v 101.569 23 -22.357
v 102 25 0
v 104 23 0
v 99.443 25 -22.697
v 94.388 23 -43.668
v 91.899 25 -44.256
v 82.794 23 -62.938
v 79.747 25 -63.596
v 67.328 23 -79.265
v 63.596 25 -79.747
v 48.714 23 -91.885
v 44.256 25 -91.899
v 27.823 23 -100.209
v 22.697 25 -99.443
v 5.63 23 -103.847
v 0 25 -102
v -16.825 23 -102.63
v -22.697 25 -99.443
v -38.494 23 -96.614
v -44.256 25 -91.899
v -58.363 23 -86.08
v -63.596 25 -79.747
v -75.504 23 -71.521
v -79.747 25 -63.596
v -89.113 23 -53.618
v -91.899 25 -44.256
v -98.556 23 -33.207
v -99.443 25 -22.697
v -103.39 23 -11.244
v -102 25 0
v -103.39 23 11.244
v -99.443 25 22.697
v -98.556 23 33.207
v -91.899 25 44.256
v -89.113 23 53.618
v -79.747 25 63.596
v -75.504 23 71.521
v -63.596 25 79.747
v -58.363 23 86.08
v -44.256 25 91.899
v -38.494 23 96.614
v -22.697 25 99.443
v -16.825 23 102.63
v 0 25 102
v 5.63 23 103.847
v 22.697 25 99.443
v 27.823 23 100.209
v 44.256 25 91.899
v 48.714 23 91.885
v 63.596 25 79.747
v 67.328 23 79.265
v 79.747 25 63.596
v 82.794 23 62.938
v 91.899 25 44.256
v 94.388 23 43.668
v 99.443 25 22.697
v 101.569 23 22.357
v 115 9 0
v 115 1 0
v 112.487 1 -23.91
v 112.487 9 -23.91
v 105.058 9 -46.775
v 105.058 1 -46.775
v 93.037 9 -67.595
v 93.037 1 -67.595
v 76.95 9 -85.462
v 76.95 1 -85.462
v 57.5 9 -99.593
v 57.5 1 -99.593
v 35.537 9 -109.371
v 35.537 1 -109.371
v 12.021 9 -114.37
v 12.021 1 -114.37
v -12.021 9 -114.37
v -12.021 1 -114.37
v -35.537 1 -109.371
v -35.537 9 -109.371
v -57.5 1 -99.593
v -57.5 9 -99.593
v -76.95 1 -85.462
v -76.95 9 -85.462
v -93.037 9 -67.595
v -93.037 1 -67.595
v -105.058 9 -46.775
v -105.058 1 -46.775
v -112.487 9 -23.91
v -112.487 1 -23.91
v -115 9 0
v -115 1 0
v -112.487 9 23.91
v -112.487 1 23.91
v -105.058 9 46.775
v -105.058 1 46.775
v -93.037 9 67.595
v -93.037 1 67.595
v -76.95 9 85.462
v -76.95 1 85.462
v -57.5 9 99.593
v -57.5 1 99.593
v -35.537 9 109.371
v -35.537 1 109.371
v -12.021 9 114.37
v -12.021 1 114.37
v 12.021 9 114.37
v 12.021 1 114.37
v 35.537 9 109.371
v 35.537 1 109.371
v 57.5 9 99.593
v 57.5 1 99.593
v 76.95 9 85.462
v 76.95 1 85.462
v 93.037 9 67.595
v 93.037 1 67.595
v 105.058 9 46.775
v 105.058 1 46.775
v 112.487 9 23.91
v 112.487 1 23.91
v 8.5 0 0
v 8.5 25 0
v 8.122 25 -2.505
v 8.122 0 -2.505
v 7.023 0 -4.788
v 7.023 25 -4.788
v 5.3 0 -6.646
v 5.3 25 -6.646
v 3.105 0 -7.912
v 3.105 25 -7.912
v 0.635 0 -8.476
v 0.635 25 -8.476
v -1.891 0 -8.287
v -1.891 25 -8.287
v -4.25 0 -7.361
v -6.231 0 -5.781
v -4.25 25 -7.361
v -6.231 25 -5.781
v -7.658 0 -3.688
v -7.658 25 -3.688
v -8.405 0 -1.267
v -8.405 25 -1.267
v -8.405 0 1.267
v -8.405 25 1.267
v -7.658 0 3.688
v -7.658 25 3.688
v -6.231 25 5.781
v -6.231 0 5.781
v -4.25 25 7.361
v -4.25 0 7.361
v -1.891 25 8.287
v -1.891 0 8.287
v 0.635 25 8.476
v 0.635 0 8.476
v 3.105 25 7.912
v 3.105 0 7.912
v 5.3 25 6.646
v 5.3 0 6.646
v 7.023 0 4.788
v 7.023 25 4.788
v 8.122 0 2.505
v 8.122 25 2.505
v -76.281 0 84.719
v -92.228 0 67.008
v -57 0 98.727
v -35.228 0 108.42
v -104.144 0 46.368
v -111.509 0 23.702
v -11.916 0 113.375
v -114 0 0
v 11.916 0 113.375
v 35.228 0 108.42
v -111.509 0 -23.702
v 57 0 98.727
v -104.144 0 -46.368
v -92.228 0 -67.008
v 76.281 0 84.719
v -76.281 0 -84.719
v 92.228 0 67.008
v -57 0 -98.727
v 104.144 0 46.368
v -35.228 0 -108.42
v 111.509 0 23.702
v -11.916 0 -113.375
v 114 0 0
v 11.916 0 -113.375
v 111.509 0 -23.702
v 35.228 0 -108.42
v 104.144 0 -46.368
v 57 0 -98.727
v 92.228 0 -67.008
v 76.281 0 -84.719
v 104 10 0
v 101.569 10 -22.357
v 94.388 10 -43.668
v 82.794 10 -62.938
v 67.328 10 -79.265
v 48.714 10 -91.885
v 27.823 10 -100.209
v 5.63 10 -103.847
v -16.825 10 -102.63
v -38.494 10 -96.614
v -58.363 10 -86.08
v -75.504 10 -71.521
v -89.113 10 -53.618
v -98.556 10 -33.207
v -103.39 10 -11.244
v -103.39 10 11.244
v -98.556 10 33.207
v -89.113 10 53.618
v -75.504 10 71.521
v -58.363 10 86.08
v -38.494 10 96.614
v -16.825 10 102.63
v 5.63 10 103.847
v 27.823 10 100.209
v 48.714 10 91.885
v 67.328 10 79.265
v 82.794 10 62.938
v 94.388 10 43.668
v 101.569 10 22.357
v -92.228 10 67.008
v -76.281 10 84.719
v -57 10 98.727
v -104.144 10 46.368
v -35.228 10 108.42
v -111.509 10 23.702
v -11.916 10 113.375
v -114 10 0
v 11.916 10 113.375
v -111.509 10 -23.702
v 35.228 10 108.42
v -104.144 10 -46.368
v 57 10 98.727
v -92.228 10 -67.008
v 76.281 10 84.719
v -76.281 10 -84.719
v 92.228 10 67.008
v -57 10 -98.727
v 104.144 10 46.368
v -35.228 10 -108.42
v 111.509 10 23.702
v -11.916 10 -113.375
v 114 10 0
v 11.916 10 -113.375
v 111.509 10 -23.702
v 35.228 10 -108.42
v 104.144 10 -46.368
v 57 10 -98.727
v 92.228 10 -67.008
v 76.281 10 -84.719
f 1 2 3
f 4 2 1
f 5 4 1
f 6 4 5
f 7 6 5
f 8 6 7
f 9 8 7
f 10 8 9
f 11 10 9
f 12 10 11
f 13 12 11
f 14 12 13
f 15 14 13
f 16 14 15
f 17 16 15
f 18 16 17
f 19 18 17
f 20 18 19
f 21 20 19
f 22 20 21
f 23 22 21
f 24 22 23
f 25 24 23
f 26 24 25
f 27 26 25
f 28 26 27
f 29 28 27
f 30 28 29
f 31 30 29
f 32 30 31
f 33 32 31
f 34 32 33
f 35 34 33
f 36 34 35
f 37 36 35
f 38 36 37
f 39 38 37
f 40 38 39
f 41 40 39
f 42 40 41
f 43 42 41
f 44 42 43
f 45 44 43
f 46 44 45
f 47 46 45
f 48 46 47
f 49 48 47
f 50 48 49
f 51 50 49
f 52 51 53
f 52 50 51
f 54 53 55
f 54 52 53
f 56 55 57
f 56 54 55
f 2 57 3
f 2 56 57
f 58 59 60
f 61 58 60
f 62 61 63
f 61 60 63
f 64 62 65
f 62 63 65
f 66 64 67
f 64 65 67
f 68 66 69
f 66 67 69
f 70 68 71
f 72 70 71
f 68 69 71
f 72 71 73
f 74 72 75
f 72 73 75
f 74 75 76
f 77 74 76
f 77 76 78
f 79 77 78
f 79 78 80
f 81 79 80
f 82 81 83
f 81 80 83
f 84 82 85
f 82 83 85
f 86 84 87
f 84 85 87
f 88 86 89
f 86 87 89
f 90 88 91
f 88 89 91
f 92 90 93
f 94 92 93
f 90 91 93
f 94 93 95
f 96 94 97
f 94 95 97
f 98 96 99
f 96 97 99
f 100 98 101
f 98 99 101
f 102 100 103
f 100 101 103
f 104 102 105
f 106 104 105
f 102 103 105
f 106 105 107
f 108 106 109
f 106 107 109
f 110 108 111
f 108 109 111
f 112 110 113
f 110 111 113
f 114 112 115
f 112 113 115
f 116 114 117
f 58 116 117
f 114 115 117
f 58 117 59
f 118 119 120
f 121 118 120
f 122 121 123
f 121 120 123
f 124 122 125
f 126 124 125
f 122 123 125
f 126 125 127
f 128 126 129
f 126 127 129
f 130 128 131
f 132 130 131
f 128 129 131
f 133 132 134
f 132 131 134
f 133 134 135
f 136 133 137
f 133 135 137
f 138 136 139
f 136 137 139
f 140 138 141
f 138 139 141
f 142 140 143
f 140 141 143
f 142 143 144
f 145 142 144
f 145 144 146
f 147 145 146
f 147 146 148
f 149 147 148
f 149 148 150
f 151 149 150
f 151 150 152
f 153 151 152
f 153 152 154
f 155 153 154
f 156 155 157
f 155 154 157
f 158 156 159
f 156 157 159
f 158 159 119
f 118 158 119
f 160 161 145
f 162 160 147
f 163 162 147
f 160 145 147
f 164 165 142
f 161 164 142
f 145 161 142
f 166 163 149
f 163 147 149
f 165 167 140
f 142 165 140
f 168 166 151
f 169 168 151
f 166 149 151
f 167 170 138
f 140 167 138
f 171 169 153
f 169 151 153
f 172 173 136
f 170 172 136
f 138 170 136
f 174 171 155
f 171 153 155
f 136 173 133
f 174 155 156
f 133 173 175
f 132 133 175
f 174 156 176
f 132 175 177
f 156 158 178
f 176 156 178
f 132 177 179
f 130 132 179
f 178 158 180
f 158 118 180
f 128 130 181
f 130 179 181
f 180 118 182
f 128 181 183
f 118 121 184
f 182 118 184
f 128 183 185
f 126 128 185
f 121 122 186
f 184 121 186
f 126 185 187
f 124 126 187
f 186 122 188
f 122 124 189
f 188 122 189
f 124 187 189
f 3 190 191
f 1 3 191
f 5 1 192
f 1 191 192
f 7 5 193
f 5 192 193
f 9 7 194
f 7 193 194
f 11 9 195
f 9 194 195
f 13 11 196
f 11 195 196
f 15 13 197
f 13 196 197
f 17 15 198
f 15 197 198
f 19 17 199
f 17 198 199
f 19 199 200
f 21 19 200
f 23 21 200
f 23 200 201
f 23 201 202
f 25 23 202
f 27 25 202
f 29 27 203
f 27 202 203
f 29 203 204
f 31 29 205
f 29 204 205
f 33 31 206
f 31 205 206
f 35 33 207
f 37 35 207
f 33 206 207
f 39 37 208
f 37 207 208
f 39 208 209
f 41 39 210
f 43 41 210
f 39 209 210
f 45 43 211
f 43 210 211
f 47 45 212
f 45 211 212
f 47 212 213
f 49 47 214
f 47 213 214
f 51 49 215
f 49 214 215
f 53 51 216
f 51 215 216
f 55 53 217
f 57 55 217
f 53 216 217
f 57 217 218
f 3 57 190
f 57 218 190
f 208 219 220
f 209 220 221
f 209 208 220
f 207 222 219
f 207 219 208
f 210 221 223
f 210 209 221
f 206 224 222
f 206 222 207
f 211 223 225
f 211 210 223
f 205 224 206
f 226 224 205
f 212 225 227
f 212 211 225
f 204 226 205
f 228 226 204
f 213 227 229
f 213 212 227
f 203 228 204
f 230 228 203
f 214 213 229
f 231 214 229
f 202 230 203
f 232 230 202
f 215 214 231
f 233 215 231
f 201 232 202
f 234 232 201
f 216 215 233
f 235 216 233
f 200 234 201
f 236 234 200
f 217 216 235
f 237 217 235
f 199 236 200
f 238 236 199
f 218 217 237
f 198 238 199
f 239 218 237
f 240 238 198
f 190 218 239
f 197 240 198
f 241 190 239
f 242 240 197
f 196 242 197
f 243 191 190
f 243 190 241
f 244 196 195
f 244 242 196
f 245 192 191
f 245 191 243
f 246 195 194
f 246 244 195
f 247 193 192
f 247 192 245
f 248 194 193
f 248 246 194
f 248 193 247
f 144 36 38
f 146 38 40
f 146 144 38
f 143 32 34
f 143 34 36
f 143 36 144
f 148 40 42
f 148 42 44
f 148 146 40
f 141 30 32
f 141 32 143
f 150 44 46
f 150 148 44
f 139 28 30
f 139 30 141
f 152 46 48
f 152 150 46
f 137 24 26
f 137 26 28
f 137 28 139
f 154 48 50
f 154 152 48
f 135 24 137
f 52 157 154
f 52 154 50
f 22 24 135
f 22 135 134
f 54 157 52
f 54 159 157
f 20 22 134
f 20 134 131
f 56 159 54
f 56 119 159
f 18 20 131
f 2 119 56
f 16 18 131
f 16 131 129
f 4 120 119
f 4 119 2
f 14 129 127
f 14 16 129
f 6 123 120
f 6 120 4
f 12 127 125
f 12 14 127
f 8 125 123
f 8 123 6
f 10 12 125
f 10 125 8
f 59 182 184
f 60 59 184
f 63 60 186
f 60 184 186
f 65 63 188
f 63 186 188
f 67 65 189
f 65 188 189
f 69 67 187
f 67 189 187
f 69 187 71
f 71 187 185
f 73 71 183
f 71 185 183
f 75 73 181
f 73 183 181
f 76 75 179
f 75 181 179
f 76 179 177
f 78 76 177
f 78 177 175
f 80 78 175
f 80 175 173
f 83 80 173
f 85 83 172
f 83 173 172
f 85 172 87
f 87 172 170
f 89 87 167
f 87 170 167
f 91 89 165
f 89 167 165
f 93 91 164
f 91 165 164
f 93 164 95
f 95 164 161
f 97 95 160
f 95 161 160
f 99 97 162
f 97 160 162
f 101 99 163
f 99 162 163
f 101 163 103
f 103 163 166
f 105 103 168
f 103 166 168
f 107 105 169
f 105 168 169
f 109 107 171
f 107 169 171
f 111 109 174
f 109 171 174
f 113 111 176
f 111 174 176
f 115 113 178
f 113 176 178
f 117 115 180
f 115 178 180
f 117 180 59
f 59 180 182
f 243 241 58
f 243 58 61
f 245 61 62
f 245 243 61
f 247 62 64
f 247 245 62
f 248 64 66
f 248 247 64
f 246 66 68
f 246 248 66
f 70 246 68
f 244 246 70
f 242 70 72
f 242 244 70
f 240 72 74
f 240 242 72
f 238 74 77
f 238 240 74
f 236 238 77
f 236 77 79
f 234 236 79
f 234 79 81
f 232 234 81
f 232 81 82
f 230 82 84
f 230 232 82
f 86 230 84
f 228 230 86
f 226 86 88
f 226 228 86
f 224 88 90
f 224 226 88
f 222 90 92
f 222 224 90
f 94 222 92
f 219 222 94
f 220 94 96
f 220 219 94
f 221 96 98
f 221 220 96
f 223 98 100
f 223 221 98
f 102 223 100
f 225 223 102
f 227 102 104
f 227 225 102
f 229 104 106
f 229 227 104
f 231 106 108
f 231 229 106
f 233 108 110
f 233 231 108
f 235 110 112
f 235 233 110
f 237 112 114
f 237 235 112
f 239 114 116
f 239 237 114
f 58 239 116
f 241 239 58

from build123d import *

# Parameters (mm, degrees)
SKETCH_1_R          = 115
EXTRUDE_1_DEPTH     = 10
SKETCH_2_R          = 104
EXTRUDE_2_DEPTH     = 15
CHAMFER_1_SIZE      = 1
CHAMFER_2_SIZE      = 2
SKETCH_3_R          = 8.5
CUT_EXTRUDE_1_DEPTH = 25


with BuildPart() as part:
    # Эскиз1 → Бобышка-Вытянуть1 (new body)
    with BuildSketch(Plane(origin=(0, 0, 0), x_dir=(1, 0, 0), z_dir=(0, 1, 0))):
        Circle(SKETCH_1_R)
    extrude(amount=EXTRUDE_1_DEPTH)

    # Эскиз2 → Бобышка-Вытянуть2 (add)
    with BuildSketch(Plane(origin=(0, 10, 0), x_dir=(1, 0, 0), z_dir=(0, 1, 0))):
        Circle(SKETCH_2_R)
    extrude(amount=EXTRUDE_2_DEPTH)

    # Фаска1
    chamfer_1_edges = [part.edges().sort_by_distance(p)[0] for p in [
        (-115, 0, 0),
        (-115, 10, 0),
    ]]
    chamfer(chamfer_1_edges, length=CHAMFER_1_SIZE)

    # Фаска2
    chamfer_2_edges = [part.edges().sort_by_distance(p)[0] for p in [
        (-104, 25, 0),
    ]]
    chamfer(chamfer_2_edges, length=CHAMFER_2_SIZE)

    # Эскиз3 → Вырез-Вытянуть1 (cut)
    with BuildSketch(Plane(origin=(0, 25, 0), x_dir=(1, 0, 0), z_dir=(0, 1, 0))):
        Circle(SKETCH_3_R)
    extrude(amount=-CUT_EXTRUDE_1_DEPTH, mode=Mode.SUBTRACT)


solid = part.part
